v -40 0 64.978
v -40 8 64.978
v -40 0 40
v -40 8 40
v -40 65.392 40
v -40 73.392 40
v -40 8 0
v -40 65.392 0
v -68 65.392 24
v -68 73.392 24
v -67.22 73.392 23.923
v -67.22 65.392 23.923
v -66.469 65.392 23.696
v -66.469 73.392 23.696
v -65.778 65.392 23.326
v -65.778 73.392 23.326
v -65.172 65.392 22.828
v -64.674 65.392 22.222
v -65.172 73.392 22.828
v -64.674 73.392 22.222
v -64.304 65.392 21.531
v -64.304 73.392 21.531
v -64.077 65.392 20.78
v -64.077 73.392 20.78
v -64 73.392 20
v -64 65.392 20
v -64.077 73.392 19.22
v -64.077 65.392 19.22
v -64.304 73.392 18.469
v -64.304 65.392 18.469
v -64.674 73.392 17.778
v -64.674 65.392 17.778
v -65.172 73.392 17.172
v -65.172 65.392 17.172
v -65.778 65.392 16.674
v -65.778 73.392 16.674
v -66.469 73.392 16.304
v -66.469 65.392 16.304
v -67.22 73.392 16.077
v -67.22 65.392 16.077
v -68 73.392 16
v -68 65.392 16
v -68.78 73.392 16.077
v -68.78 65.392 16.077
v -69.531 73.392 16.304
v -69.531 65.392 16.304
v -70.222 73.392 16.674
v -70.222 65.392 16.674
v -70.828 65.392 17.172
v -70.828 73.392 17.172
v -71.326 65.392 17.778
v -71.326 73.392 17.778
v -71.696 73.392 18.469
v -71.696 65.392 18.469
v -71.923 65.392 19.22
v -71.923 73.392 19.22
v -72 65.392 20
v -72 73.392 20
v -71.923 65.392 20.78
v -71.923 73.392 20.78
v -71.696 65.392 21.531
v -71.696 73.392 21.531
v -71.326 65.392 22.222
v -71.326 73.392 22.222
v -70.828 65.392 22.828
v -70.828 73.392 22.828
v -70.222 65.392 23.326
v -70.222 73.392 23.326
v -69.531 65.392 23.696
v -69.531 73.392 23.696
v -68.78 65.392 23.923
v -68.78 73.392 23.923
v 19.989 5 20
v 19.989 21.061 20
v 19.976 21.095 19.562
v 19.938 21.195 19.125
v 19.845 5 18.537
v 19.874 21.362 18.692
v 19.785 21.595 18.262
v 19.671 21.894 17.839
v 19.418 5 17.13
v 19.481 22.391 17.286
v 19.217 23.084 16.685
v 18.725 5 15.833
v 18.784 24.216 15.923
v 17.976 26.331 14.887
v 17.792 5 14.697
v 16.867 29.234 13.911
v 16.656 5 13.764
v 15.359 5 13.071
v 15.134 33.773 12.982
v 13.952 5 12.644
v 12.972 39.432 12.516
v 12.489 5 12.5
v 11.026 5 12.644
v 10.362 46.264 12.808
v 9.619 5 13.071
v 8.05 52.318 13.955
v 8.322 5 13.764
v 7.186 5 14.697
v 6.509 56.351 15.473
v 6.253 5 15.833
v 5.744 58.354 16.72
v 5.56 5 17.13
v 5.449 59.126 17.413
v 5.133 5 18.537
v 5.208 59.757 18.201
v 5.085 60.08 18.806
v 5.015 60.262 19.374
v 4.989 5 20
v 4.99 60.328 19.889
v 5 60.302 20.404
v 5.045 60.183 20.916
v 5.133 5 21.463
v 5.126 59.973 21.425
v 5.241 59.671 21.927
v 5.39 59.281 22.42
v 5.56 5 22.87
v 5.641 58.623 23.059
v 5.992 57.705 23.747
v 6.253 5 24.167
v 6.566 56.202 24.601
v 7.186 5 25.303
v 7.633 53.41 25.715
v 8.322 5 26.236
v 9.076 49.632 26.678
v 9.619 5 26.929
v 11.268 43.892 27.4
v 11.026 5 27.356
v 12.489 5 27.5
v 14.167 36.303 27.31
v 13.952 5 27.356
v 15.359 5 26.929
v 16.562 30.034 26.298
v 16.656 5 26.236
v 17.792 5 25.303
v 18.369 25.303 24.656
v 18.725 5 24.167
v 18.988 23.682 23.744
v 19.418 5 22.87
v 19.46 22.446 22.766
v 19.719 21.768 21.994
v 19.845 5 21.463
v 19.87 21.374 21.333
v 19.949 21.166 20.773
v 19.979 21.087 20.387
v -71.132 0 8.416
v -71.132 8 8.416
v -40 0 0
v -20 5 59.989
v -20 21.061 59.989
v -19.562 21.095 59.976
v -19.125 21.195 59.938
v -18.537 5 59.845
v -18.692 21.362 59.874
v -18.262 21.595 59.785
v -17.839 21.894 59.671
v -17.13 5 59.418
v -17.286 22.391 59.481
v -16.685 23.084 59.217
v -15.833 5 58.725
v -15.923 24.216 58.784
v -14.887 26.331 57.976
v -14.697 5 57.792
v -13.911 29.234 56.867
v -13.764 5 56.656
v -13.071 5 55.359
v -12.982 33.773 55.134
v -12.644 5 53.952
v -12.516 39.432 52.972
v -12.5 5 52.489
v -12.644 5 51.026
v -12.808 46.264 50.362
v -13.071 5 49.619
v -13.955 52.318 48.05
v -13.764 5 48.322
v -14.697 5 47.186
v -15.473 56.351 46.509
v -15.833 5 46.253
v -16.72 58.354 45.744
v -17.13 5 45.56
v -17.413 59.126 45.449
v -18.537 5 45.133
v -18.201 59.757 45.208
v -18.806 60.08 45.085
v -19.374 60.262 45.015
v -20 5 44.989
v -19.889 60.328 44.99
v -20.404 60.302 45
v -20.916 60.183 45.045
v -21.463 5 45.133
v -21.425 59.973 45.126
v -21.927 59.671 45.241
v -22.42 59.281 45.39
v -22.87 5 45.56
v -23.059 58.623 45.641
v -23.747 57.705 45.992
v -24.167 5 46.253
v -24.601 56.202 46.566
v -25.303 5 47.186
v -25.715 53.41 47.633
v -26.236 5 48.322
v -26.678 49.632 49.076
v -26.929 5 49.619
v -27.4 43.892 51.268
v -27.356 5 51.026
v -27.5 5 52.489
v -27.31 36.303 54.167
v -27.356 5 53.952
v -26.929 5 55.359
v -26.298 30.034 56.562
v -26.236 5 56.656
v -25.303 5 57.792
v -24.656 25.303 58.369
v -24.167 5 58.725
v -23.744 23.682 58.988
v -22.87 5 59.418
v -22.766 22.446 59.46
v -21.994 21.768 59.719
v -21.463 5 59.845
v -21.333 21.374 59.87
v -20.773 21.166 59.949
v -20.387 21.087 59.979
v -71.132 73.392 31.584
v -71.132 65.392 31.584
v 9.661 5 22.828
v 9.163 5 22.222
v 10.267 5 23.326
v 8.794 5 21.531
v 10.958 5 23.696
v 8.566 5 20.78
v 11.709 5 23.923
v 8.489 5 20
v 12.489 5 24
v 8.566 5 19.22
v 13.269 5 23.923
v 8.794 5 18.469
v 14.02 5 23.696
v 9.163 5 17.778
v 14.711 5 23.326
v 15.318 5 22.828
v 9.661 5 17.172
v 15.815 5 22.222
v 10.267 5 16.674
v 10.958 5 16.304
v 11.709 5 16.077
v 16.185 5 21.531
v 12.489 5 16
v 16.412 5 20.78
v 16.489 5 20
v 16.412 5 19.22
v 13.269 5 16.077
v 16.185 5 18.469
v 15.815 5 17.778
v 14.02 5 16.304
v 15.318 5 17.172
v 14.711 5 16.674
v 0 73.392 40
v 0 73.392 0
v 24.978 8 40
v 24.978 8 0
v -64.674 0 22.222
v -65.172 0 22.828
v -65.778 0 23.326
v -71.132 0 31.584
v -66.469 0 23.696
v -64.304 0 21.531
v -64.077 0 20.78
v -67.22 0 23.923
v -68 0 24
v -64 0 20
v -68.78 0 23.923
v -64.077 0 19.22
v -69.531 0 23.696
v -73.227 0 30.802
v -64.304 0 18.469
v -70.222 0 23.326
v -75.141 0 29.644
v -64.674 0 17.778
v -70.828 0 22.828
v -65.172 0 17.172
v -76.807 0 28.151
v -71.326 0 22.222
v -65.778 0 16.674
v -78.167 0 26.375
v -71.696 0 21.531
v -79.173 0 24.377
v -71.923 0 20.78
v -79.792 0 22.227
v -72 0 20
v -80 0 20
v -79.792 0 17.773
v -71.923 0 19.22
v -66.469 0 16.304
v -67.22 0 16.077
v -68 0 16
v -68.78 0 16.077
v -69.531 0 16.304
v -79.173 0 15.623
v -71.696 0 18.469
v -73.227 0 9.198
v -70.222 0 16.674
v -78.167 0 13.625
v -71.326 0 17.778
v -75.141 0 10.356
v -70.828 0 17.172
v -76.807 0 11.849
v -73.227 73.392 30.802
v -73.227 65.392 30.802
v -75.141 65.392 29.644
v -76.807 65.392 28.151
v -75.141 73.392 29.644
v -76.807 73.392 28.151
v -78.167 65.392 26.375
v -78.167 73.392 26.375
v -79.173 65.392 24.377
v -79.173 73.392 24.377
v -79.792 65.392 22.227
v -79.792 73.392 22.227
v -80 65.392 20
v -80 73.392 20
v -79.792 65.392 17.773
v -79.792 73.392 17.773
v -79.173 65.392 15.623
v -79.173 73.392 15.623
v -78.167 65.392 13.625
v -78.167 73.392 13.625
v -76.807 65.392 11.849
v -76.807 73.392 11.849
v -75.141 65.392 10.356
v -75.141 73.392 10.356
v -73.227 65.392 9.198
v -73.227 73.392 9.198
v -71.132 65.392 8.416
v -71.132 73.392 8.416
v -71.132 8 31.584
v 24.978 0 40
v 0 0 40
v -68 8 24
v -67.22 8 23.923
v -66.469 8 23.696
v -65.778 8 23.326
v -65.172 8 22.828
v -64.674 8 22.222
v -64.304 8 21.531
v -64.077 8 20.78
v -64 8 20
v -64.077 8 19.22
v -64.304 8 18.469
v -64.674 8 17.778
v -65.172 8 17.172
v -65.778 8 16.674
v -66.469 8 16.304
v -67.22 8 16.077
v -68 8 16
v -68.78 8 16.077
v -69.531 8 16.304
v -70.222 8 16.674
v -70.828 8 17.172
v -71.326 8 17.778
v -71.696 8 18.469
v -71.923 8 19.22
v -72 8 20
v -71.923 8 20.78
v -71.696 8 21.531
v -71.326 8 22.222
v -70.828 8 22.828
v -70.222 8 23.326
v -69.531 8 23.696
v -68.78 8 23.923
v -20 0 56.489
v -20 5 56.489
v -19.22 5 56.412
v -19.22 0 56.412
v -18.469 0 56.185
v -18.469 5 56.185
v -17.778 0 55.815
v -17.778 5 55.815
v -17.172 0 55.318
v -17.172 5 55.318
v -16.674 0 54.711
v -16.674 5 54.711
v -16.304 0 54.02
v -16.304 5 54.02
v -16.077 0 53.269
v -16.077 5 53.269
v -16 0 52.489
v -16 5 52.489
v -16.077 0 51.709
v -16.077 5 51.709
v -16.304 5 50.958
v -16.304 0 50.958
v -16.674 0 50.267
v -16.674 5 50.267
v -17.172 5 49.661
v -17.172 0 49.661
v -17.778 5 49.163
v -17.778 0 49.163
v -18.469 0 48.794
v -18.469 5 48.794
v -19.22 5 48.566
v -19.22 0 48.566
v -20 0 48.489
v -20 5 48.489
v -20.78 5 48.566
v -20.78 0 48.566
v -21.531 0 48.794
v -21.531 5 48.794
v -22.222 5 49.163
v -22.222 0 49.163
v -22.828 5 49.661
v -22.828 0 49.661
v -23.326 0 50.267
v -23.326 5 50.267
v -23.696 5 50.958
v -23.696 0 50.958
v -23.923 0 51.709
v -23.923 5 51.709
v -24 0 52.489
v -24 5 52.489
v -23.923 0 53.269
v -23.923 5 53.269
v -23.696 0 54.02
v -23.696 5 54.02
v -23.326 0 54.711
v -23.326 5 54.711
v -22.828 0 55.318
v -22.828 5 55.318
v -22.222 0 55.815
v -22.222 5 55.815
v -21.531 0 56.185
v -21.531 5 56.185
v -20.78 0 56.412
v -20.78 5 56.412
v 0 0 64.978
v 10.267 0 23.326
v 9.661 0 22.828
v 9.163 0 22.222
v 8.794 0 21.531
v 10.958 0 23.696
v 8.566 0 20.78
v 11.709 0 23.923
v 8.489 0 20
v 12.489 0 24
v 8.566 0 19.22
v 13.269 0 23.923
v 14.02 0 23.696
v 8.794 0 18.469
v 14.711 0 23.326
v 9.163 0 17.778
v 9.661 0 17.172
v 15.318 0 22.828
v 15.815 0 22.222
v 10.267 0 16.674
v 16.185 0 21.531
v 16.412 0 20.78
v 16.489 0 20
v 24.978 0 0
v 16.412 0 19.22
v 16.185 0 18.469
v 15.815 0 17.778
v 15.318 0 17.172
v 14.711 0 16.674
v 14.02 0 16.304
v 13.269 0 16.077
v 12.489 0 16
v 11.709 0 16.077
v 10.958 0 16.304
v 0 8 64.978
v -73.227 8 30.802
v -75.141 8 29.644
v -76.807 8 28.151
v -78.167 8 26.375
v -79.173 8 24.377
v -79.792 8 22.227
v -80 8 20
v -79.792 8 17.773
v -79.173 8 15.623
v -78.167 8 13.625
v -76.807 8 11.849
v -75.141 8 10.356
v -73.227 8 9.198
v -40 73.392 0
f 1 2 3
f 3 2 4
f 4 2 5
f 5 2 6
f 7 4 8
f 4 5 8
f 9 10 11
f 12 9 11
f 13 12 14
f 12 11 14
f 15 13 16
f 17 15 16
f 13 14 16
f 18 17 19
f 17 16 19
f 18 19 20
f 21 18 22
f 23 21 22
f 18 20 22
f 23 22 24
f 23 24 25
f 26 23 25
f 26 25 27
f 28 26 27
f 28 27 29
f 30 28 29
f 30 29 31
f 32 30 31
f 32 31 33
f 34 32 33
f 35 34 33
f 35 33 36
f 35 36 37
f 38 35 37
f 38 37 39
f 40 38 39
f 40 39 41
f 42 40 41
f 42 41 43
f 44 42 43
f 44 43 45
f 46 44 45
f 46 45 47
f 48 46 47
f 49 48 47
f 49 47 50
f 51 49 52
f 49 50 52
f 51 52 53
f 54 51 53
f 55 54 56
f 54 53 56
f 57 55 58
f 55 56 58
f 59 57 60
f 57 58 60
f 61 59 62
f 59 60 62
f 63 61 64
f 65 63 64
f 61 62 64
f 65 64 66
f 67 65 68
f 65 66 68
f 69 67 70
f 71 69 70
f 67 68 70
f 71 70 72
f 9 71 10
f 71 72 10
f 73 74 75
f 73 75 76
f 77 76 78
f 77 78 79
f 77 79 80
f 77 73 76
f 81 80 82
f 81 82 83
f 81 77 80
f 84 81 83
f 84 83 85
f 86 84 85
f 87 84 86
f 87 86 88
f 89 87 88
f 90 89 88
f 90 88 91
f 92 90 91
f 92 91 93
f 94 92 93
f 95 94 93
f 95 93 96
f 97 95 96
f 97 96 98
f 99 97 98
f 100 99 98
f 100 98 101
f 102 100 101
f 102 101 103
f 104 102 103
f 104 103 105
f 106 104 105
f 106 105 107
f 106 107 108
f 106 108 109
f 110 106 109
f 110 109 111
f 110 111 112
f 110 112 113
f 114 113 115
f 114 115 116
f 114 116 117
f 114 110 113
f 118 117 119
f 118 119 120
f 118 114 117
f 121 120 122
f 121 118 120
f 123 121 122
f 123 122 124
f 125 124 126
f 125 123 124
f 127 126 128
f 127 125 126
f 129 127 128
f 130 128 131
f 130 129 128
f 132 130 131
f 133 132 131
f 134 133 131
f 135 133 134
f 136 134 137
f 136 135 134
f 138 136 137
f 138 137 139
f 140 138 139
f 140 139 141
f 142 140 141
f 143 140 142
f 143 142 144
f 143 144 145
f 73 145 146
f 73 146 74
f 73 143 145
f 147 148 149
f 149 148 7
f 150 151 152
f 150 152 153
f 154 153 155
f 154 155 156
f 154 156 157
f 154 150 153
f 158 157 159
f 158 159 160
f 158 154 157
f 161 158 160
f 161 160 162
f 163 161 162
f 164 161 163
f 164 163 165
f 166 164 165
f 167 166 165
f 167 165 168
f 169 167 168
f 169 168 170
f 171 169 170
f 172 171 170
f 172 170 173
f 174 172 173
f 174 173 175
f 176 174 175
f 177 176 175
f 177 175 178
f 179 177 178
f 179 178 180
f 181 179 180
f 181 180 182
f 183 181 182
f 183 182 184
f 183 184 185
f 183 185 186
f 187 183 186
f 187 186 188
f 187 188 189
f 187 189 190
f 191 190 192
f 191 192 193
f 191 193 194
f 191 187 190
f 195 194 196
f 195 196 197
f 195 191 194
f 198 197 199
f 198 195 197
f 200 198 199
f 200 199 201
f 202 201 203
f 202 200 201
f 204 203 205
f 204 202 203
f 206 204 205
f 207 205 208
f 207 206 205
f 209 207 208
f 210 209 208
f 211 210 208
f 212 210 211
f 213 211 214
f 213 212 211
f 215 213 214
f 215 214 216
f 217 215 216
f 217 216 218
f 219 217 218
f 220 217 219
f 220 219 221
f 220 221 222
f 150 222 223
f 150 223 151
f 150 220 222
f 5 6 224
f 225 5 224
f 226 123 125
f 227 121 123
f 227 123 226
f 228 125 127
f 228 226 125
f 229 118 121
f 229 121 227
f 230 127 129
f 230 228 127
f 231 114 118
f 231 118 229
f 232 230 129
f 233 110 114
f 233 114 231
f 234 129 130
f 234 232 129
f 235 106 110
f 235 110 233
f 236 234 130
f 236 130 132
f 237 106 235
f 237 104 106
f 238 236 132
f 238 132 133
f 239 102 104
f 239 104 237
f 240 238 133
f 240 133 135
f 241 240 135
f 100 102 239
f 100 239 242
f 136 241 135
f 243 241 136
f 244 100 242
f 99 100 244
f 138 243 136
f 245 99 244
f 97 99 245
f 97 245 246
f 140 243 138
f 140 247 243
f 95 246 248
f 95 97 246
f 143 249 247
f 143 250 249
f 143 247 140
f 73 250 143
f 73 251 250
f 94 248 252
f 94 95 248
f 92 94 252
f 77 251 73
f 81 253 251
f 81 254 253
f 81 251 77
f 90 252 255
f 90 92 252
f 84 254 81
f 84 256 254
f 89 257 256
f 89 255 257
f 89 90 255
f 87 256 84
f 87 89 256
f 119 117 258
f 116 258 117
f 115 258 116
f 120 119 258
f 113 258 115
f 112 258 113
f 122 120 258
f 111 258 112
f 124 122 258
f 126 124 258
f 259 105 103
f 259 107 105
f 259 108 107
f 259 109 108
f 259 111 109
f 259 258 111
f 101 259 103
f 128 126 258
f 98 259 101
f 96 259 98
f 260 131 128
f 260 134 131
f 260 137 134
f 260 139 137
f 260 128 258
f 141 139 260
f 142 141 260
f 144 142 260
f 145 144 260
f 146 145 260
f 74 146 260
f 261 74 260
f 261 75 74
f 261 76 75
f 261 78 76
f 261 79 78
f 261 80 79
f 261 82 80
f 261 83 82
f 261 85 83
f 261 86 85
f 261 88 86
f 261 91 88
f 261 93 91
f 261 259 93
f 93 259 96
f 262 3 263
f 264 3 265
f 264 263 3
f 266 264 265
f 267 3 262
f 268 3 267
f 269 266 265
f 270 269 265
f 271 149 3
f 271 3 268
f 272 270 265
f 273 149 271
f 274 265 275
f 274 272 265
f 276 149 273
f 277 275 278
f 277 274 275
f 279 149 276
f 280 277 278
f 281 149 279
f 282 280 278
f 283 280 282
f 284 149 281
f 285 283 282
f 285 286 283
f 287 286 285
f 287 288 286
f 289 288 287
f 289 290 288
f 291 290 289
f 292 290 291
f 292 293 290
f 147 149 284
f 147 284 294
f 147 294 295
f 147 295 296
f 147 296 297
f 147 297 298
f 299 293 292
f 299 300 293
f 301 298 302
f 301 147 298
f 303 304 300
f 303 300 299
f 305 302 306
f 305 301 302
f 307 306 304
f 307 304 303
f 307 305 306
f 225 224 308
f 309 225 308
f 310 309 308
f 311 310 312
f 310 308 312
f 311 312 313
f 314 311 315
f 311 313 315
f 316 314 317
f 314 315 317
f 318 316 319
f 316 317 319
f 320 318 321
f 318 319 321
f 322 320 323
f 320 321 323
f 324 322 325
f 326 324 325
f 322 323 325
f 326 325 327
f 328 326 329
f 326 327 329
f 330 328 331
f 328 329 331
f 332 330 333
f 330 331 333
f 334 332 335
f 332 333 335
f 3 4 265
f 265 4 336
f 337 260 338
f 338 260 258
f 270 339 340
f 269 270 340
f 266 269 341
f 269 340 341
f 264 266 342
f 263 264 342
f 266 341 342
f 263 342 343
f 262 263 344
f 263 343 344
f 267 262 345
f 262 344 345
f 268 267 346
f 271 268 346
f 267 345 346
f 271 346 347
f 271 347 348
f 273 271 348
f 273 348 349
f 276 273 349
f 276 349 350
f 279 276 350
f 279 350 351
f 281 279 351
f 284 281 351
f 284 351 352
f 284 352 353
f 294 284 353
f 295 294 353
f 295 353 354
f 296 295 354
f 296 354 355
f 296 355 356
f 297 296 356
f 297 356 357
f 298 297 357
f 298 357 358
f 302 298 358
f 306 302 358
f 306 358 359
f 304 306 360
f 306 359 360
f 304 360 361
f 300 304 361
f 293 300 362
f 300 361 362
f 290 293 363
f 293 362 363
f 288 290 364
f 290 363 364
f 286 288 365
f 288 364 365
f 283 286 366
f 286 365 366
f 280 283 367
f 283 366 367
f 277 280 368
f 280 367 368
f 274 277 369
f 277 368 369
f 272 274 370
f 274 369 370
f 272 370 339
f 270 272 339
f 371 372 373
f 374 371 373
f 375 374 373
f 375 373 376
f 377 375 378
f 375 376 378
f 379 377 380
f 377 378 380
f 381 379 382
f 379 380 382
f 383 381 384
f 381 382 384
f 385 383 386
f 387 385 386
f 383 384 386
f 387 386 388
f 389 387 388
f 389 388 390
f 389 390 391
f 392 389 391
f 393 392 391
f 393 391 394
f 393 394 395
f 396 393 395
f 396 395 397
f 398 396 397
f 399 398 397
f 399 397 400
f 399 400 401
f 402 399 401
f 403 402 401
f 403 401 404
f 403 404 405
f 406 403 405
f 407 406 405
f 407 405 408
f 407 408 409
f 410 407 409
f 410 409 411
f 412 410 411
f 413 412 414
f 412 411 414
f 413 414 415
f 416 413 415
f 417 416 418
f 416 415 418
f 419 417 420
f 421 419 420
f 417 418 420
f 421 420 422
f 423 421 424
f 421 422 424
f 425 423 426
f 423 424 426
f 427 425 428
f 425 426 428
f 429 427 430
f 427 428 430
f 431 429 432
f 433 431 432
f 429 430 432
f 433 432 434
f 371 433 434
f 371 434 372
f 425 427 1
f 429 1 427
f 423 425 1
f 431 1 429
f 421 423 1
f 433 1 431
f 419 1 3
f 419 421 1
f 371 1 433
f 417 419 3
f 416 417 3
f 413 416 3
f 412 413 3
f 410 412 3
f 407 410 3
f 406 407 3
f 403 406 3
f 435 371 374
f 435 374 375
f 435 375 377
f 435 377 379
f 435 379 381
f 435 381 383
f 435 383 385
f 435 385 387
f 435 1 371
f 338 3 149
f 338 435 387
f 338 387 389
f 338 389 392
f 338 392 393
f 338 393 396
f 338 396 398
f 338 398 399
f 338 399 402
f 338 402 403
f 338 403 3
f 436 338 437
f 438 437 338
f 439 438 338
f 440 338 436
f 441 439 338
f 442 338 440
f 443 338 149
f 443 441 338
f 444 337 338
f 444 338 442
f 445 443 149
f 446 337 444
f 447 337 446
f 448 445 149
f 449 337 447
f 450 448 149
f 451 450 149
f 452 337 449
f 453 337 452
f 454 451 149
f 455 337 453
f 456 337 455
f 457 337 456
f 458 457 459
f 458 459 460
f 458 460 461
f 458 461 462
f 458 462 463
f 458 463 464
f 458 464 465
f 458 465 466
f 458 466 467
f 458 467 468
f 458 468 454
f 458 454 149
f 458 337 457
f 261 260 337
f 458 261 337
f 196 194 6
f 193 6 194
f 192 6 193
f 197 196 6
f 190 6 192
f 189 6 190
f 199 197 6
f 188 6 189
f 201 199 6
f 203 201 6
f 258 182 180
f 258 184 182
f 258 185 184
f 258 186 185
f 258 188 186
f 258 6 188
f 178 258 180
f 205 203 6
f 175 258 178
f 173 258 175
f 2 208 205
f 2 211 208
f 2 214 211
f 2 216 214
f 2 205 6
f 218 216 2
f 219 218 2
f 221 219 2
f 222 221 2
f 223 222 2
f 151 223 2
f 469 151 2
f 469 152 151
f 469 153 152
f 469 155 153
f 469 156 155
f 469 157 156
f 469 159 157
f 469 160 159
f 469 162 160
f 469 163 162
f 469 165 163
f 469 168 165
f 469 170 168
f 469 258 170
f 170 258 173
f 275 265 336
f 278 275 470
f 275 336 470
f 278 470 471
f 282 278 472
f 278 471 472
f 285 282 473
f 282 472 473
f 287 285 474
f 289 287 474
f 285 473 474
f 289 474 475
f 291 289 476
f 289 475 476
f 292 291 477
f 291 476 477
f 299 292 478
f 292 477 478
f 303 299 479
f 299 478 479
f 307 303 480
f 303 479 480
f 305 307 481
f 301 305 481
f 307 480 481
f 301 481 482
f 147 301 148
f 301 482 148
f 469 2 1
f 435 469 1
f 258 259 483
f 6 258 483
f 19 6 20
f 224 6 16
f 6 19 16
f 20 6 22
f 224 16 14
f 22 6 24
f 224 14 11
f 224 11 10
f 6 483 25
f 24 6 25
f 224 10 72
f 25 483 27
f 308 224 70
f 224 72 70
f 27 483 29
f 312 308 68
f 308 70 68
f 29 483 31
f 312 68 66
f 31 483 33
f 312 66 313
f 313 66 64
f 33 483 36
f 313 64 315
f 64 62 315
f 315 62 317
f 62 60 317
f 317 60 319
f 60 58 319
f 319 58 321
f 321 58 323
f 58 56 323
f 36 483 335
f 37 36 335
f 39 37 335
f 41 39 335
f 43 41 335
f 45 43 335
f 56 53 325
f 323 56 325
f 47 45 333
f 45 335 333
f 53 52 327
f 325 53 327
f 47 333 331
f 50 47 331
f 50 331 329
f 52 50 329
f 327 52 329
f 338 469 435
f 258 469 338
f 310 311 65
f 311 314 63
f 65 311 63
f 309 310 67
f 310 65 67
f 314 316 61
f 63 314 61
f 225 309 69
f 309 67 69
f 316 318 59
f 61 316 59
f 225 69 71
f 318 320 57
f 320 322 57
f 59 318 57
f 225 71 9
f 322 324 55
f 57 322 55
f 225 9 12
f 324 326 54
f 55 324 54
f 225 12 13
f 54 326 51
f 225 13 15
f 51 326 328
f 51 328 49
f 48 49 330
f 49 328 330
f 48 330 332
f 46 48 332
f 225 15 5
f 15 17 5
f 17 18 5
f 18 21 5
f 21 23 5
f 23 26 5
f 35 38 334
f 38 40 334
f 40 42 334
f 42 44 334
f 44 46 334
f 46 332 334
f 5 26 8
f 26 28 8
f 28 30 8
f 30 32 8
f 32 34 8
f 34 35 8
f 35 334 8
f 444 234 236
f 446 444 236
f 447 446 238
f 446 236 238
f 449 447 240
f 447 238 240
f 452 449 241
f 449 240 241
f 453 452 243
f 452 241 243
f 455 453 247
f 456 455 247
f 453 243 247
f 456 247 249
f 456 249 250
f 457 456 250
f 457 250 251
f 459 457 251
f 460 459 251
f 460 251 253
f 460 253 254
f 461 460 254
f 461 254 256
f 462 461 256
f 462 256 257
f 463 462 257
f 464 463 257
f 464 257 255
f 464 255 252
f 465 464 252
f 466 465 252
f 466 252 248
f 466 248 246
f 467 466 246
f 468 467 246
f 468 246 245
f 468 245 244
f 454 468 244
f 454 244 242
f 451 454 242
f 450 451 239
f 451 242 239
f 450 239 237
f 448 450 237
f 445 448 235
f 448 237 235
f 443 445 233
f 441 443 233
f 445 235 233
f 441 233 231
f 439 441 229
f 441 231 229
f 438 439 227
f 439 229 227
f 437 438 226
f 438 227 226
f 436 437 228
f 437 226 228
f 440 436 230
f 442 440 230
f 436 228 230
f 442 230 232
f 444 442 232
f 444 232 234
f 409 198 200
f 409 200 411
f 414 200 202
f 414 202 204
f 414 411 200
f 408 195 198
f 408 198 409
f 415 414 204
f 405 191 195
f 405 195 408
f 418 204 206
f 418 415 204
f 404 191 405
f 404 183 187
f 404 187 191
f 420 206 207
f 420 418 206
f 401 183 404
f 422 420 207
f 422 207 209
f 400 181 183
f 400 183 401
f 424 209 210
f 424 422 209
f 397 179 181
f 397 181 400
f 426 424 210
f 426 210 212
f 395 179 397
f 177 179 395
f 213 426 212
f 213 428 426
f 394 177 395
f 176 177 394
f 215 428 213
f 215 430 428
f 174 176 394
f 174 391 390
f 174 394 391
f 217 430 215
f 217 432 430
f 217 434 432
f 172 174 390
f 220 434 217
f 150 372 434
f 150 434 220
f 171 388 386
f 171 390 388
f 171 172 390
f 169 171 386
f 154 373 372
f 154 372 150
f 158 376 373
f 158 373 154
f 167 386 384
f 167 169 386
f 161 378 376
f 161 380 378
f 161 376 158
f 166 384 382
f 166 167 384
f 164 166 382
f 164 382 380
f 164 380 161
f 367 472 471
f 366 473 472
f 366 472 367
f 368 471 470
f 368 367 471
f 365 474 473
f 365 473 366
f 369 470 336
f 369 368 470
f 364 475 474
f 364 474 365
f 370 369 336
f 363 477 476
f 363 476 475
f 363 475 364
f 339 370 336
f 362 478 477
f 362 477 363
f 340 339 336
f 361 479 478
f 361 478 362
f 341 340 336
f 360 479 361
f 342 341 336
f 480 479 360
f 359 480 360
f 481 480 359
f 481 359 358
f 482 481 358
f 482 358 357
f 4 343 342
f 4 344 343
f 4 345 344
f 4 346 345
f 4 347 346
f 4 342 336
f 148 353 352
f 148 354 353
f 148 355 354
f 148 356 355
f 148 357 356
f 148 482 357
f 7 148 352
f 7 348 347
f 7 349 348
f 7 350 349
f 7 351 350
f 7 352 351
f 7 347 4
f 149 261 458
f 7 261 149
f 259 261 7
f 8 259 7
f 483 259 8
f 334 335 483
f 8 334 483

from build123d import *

# Parameters (mm, degrees)
BOSS_EXTRUDE1_DEPTH = 40
BOSS_EXTRUDE2_DEPTH = 73.391828
SKETCH4_W           = 40
SKETCH4_H           = 57.391828437
CUT_EXTRUDE1_DEPTH  = 73
BOSS_EXTRUDE4_DEPTH = 40
SKETCH8_R           = 4
CUT_EXTRUDE2_DEPTH  = 127.52479018
SKETCH10_R          = 7.5
CUT_EXTRUDE3_DEPTH  = 124.691569016


with BuildPart() as part:
    # Sketch2 → Boss-Extrude1 (new body)
    with BuildSketch(Plane.XY):
        Polygon((0, 0), (-40, 0), (-40, 73.391828437), (0, 73.391828437), (24.978165939, 8), (24.978165939, 0), align=None)
    extrude(amount=BOSS_EXTRUDE1_DEPTH)

    # Sketch3 → Boss-Extrude2 (add)
    with BuildSketch(Plane(origin=(0, 73.391828437, 0), x_dir=(1, 0, 0), z_dir=(0, 1, 0))):
        with BuildLine():
            Line((-40, -40), (-71.131560336, -31.584184471))
            ThreePointArc((-71.131560336, -31.584184471), (-80, -20), (-71.131560336, -8.415815529))
            Line((-71.131560336, -8.415815529), (-40, 0))
            Line((-40, 0), (-40, -40))
        make_face()
    extrude(amount=-BOSS_EXTRUDE2_DEPTH)

    # Sketch4 → Cut-Extrude1 (cut)
    with BuildSketch(Plane.XY):
        with Locations((-60, 36.695914219)):
            Rectangle(SKETCH4_W, SKETCH4_H)
    extrude(amount=CUT_EXTRUDE1_DEPTH, mode=Mode.SUBTRACT)

    # Sketch6 → Boss-Extrude4 (add)
    with BuildSketch(Plane(origin=(0, 0, 0), x_dir=(0, 0, -1), z_dir=(1, 0, 0))):
        Polygon((-40, 73.391828437), (-64.978165939, 8), (-64.978165939, 0), (-40, 0), align=None)
    extrude(amount=-BOSS_EXTRUDE4_DEPTH)

    # Sketch8 → Cut-Extrude2 (cut, through all)
    with BuildSketch(Plane(origin=(0, 73.391828437, 0), x_dir=(1, 0, 0), z_dir=(0, 1, 0))):
        with Locations(Location((12.489082969, -20, 0), (0, 0, 270))):
            Circle(SKETCH8_R)
        with Locations(Location((-20, -52.489082969, 0), (0, 0, 270))):
            Circle(SKETCH8_R)
        with Locations(Location((-68, -20, 0), (0, 0, 270))):
            Circle(SKETCH8_R)
    extrude(amount=-CUT_EXTRUDE2_DEPTH, mode=Mode.SUBTRACT)

    # Sketch10 → Cut-Extrude3 (cut, through all)
    with BuildSketch(Plane(origin=(0, 5, 0), x_dir=(1, 0, 0), z_dir=(0, 1, 0))):
        with Locations((12.489082969, -20)):
            Circle(SKETCH10_R)
        with Locations(Location((-20, -52.489082969, 0), (0, 0, 270))):
            Circle(SKETCH10_R)
    extrude(amount=CUT_EXTRUDE3_DEPTH, mode=Mode.SUBTRACT)


solid = part.part
